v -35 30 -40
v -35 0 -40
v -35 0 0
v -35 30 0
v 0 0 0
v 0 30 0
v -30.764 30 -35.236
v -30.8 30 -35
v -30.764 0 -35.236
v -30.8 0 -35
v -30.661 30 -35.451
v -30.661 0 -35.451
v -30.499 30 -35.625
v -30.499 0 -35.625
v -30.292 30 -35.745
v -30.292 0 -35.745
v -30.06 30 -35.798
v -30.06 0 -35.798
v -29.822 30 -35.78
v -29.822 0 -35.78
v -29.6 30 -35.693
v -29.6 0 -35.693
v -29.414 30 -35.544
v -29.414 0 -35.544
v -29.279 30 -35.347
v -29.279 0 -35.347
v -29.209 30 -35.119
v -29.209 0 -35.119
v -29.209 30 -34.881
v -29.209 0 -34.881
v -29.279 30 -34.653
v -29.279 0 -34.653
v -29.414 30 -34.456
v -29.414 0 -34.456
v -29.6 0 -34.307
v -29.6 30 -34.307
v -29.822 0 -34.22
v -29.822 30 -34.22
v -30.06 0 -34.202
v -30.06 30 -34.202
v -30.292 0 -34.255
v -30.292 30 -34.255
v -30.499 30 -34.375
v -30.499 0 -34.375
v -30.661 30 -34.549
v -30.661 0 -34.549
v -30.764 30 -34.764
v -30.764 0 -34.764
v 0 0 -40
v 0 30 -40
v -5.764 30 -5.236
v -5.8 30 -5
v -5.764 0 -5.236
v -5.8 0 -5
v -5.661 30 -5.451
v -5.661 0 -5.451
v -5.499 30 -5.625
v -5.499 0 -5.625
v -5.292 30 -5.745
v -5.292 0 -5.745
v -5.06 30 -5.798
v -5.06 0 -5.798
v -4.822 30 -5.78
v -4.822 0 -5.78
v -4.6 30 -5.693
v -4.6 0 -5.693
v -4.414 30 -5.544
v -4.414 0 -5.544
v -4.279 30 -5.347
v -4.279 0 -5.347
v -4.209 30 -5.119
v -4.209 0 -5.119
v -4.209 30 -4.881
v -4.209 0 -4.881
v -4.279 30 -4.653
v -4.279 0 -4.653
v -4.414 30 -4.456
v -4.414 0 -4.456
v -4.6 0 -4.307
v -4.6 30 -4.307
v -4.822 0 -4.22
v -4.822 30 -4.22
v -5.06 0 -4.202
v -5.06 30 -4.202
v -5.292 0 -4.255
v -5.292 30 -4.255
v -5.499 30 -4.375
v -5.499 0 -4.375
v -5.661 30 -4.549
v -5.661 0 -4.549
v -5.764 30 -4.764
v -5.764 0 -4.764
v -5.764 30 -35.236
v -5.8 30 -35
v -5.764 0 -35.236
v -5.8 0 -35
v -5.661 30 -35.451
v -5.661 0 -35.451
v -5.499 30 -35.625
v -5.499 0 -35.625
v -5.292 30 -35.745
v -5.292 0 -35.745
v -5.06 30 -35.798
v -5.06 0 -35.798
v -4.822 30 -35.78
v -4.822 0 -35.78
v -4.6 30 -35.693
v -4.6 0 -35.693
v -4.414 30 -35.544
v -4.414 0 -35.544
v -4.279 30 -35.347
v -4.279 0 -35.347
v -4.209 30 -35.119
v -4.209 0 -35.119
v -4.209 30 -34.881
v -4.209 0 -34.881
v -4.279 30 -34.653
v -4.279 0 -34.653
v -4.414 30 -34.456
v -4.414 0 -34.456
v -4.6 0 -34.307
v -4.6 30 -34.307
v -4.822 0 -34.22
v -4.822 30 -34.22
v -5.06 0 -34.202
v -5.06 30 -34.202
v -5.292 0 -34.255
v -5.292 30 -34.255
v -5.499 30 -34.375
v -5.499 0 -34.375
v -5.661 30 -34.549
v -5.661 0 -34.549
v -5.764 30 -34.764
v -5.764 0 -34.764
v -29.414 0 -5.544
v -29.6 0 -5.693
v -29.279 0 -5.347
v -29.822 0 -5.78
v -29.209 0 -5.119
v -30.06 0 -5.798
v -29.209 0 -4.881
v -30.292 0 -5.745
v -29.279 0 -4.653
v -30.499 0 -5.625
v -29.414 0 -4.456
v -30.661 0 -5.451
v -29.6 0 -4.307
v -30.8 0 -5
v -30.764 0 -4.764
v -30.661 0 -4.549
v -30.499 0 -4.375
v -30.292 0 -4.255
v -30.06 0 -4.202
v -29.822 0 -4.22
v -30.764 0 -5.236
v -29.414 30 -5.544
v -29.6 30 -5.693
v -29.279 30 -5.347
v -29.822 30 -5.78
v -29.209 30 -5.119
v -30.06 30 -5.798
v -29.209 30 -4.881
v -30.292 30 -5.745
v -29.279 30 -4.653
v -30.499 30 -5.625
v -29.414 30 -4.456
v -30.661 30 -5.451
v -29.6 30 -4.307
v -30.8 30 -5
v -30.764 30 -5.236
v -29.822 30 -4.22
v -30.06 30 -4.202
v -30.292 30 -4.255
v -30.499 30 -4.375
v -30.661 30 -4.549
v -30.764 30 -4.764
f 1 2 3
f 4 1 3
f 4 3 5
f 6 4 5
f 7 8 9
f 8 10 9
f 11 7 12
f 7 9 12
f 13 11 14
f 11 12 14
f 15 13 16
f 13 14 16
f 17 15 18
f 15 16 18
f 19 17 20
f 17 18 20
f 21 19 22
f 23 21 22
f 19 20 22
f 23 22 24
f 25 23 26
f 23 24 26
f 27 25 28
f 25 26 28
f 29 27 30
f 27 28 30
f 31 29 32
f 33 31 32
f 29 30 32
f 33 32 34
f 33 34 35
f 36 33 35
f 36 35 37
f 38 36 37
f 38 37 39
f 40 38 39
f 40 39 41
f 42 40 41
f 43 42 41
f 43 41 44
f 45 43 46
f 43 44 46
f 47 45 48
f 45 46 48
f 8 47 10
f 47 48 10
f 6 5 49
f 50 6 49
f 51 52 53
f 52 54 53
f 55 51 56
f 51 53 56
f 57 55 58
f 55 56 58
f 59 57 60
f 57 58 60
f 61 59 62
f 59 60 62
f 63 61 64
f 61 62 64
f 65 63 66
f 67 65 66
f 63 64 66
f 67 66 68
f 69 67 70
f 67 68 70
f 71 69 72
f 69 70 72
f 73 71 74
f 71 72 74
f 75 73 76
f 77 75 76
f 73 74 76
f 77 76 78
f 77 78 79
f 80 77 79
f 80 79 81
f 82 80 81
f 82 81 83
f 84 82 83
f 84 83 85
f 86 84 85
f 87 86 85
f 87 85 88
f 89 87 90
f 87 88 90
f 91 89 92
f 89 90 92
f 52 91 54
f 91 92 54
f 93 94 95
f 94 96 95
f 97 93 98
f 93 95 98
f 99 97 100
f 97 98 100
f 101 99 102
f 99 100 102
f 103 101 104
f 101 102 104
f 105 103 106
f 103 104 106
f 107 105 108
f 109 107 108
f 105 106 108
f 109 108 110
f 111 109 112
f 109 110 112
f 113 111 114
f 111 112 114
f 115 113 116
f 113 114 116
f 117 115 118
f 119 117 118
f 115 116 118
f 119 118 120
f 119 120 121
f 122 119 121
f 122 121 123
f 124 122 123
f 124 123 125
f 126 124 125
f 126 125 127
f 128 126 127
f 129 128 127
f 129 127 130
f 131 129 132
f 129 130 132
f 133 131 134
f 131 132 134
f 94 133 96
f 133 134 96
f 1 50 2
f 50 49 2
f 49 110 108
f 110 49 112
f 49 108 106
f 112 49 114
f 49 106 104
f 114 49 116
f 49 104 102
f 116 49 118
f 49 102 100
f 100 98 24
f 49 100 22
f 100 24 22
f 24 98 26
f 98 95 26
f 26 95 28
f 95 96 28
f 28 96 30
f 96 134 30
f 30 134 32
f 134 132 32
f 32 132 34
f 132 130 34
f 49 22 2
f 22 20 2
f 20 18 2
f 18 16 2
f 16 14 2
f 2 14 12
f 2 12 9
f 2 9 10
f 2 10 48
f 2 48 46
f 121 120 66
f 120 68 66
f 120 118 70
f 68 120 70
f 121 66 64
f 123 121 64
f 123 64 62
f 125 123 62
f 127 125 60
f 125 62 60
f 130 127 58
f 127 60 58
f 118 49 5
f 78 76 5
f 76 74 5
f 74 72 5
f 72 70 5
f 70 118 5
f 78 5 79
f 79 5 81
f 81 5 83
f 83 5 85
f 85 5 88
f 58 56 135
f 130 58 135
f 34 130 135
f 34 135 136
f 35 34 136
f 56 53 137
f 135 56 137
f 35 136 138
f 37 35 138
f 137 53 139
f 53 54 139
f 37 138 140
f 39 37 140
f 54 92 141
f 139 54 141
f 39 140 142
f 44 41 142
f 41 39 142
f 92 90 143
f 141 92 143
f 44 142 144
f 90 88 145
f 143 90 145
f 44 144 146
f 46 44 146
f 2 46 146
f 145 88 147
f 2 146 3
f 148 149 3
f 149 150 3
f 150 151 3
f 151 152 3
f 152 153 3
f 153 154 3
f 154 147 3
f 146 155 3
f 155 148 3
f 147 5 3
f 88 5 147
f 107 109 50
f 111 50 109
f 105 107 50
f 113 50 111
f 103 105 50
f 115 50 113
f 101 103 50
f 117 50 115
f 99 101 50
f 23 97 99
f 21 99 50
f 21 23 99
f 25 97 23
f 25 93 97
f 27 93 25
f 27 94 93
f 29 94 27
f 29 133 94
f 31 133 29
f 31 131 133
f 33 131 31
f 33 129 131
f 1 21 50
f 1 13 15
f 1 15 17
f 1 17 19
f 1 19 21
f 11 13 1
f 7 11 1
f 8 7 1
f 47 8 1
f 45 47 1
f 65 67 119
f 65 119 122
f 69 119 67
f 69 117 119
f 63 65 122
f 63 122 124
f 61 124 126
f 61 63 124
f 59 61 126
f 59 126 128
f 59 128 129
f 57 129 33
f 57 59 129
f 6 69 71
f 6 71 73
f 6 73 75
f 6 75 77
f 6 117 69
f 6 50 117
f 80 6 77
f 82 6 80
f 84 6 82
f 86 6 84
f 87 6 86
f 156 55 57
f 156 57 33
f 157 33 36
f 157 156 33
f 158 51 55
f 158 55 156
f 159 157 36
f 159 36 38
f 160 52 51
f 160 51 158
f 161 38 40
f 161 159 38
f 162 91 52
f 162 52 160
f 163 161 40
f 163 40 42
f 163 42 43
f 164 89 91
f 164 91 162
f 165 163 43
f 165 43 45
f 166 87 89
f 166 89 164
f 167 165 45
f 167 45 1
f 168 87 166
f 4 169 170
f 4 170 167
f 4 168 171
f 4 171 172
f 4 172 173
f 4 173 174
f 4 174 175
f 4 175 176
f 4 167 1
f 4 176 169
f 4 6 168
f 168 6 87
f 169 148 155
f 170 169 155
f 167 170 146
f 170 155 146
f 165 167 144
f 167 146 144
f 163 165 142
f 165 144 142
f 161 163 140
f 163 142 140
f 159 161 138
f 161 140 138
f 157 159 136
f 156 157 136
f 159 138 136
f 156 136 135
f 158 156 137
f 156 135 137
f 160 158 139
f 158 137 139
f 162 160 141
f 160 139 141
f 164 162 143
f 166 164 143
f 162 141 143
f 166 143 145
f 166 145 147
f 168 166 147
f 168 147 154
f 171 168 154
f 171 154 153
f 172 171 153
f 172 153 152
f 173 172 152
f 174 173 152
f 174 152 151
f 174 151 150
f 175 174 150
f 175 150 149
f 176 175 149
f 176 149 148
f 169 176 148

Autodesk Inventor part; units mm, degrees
ref_plane "YZ Plane" through (0, 0, 0) normal (1, 0, 0) x (0, 1, 0)
ref_plane "XZ Plane" through (0, 0, 0) normal (0, 1, 0) x (-1, 0, 0)
ref_plane "XY Plane" through (0, 0, 0) normal (0, 0, 1) x (1, 0, 0)
sketch "スケッチ1" plane through (0, 0, 0) normal (0, 1, 0) x (-1, 0, 0)
  line L0 (35, 0) -> (0, 0)
  line L1 (0, 0) -> (0, -40)
  line L2 (0, -40) -> (35, -40)
  line L3 (35, -40) -> (35, 0)
  line L4 (30, -5) -> (5, -5)
  line L5 (5, -5) -> (5, -35)
  line L6 (5, -35) -> (30, -35)
  line L7 (30, -35) -> (30, -5)
  circle A0 centre (30, -5) radius 0.8
  circle A1 centre (30, -35) radius 0.8
  circle A2 centre (5, -35) radius 0.8
  circle A3 centre (5, -5) radius 0.8
  dimension "d0" = 25
  dimension "d1" = 30
  dimension "d2" = 5
  dimension "d3" = 5
  dimension "d4" = 5
  dimension "d5" = 5
  dimension "d6" = 1.6
  dimension "d7" = 1.6
  dimension "d8" = 1.6
  dimension "d9" = 1.6
extrude "押し出し1" add sketch "スケッチ1" along normal blind 30 contours L3 L2 L1 L0 | L4 A0 L7 A1 L6 A2 L5 A3
equation "\"d3\" = d2"
equation "\"d4\" = d2"
equation "\"d5\" = d2"
properties part number "board"
